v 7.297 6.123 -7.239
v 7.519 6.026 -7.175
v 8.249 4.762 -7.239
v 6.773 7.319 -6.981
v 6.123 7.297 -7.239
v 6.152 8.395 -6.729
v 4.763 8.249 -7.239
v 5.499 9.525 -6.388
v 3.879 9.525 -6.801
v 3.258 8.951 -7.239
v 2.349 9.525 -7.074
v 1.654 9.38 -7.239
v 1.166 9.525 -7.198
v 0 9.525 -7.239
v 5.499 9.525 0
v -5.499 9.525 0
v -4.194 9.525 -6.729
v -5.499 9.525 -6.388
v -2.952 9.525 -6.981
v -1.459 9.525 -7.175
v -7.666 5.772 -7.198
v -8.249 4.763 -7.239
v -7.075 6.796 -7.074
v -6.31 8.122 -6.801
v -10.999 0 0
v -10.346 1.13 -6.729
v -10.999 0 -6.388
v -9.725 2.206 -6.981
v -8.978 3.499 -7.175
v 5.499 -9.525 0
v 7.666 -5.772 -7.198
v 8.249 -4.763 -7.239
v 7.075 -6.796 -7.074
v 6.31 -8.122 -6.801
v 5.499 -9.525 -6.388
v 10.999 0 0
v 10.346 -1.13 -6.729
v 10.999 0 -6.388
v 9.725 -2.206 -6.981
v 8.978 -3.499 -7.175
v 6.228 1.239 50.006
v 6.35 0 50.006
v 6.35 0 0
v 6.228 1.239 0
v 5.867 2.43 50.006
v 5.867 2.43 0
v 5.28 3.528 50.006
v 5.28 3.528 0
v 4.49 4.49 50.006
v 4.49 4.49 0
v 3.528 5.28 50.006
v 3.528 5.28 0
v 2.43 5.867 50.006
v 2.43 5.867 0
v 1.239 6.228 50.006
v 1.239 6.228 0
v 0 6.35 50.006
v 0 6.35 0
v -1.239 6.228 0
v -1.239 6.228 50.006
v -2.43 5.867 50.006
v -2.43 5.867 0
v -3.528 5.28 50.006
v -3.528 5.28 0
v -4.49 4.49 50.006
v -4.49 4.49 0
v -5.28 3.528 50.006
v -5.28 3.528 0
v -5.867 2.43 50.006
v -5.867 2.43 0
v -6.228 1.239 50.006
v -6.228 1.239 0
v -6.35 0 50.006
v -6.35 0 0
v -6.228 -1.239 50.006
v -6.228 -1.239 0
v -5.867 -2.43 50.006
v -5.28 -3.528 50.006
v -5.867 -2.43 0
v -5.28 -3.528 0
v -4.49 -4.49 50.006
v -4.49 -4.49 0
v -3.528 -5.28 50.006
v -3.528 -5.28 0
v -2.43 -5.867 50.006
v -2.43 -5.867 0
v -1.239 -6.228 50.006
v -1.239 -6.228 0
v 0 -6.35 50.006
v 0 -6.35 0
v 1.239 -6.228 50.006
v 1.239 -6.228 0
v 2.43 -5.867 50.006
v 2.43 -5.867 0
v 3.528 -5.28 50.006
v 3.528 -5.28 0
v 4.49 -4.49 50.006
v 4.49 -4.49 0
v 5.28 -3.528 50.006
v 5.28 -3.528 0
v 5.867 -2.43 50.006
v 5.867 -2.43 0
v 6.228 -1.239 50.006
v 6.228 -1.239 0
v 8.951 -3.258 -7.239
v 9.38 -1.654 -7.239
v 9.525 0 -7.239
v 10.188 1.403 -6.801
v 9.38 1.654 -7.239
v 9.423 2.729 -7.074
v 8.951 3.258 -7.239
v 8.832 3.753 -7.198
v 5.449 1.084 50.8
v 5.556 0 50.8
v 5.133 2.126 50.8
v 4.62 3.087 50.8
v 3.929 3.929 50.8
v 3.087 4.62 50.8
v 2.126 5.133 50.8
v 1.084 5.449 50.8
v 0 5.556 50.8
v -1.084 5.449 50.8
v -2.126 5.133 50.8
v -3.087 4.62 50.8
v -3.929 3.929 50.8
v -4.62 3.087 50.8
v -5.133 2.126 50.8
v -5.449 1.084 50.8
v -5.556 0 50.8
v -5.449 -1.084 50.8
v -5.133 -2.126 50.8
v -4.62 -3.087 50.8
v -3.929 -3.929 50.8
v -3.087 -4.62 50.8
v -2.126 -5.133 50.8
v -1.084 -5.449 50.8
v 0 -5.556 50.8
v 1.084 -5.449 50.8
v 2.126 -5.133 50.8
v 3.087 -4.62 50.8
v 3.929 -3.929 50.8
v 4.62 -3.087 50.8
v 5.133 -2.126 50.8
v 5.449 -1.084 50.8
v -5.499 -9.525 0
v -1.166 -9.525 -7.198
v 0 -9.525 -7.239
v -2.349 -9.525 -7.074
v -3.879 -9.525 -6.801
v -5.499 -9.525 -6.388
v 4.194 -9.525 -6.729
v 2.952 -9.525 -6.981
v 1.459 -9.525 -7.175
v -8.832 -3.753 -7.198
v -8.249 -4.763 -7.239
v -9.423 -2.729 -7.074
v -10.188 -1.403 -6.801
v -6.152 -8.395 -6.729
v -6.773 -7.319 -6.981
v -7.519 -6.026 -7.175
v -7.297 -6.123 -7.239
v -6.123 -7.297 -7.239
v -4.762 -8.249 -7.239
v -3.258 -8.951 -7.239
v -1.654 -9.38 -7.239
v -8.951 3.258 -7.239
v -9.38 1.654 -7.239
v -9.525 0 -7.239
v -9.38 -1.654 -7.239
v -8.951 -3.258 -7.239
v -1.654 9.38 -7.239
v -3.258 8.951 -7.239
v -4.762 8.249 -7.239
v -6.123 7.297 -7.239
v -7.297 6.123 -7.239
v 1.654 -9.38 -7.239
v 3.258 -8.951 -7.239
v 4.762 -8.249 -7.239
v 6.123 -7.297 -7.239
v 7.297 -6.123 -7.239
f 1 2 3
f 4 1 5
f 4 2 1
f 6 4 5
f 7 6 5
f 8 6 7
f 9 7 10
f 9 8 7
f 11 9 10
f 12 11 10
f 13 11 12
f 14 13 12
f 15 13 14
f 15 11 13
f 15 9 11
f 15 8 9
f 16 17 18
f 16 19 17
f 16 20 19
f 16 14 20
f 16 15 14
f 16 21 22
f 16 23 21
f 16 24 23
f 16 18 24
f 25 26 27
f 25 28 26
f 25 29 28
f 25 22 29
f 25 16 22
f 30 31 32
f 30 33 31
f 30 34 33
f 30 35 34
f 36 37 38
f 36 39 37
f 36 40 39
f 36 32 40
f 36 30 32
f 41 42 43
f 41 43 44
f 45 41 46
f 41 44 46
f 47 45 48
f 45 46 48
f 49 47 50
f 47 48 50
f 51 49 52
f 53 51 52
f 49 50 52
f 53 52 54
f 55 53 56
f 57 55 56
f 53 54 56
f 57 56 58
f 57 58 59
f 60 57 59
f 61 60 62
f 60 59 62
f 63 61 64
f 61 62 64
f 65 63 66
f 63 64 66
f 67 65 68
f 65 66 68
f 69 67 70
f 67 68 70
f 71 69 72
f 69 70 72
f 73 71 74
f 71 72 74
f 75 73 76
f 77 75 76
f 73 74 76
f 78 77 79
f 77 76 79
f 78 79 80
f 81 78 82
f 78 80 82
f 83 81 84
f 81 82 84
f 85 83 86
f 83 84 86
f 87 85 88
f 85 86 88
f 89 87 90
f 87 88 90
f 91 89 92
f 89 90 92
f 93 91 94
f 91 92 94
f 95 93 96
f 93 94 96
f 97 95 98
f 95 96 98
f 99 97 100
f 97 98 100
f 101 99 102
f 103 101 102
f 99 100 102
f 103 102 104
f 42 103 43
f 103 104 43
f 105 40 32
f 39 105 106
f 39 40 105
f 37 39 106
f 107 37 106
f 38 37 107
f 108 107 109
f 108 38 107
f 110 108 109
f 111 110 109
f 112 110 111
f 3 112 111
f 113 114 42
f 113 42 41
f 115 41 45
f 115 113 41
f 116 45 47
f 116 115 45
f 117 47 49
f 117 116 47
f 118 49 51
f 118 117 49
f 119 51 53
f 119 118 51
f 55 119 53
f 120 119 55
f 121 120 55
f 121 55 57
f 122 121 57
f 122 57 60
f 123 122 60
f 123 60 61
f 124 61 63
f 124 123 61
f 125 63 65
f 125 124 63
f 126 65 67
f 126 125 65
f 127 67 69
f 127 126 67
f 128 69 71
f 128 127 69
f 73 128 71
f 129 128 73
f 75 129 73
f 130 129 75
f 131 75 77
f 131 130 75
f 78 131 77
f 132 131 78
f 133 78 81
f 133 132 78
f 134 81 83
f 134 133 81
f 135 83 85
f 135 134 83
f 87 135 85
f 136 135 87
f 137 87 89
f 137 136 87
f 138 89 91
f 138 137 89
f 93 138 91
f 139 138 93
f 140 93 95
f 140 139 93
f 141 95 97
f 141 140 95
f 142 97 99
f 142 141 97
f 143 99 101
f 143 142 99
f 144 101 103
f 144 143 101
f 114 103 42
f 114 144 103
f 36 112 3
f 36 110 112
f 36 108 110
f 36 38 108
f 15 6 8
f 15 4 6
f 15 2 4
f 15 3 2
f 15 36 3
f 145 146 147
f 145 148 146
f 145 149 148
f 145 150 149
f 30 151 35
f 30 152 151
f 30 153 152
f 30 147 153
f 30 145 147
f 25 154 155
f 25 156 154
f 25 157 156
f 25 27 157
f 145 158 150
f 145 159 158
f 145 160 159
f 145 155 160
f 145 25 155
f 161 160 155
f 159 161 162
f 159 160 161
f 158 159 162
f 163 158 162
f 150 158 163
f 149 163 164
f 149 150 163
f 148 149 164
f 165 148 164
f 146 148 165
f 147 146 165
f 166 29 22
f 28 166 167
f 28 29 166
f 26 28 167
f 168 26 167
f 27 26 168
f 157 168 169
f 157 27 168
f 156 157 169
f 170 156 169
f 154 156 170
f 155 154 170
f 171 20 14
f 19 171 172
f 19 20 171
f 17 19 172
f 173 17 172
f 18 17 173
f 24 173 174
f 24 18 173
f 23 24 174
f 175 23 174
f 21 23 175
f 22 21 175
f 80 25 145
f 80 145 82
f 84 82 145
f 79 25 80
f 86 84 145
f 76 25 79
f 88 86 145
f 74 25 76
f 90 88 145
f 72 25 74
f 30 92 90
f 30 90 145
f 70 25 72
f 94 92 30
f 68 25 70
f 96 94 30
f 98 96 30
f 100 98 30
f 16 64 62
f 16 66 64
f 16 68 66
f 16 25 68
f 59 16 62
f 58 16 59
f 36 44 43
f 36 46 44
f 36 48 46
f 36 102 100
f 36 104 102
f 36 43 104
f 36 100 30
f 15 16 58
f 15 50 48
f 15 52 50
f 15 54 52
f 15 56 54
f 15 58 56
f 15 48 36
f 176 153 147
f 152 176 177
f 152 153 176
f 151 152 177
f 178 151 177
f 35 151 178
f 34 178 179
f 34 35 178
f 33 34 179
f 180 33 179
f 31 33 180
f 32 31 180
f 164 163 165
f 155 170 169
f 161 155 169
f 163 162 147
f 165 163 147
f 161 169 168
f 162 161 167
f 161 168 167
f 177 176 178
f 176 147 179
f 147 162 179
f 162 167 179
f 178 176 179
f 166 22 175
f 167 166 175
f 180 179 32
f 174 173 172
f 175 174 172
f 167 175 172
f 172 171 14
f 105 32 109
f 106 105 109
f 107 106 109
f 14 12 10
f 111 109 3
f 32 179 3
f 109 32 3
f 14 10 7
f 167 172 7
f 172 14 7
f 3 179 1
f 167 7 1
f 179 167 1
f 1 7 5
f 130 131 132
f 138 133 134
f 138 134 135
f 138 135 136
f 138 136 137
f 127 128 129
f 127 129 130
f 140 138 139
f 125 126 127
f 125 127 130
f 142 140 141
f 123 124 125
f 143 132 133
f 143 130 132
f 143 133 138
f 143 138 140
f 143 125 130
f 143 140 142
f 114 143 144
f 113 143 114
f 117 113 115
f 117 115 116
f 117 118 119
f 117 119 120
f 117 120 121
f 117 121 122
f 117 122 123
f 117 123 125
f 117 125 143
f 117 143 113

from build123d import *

# Parameters (mm, degrees)
HEAD_DEPTH         = 7.239
SKETCH2_R          = 6.35
SHAFT_DEPTH        = 50.8
SHAFT_CHAMFER_SIZE = 0.79375


with BuildPart() as part:
    # Head Sketch → Head (new body)
    with BuildSketch(Plane.XY):
        Polygon((10.998522628, 0), (5.499261314, 9.525), (-5.499261314, 9.525), (-10.998522628, 0), (-5.499261314, -9.525), (5.499261314, -9.525), align=None)
    extrude(amount=-HEAD_DEPTH)

    # Sketch9 → Head Chamfer (revolve, cut)
    with BuildSketch(Plane(origin=(0, 0, 0), x_dir=(1, 0, 0), z_dir=(0, 1, 0))):
        Polygon((10.998522628, 7.239), (9.525, 7.239), (10.998522628, 6.388261314), align=None)
    revolve(axis=Axis((0, 0, -10.14095), (0, 0, 1)), mode=Mode.SUBTRACT)

    # Sketch2 → Shaft (add)
    with BuildSketch(Plane.XY):
        Circle(SKETCH2_R)
    extrude(amount=SHAFT_DEPTH)

    # Shaft Chamfer
    shaft_chamfer_edges = [part.edges().sort_by_distance(p)[0] for p in [
        (-6.35, 0, 50.8),
    ]]
    chamfer(shaft_chamfer_edges, length=SHAFT_CHAMFER_SIZE)


solid = part.part
